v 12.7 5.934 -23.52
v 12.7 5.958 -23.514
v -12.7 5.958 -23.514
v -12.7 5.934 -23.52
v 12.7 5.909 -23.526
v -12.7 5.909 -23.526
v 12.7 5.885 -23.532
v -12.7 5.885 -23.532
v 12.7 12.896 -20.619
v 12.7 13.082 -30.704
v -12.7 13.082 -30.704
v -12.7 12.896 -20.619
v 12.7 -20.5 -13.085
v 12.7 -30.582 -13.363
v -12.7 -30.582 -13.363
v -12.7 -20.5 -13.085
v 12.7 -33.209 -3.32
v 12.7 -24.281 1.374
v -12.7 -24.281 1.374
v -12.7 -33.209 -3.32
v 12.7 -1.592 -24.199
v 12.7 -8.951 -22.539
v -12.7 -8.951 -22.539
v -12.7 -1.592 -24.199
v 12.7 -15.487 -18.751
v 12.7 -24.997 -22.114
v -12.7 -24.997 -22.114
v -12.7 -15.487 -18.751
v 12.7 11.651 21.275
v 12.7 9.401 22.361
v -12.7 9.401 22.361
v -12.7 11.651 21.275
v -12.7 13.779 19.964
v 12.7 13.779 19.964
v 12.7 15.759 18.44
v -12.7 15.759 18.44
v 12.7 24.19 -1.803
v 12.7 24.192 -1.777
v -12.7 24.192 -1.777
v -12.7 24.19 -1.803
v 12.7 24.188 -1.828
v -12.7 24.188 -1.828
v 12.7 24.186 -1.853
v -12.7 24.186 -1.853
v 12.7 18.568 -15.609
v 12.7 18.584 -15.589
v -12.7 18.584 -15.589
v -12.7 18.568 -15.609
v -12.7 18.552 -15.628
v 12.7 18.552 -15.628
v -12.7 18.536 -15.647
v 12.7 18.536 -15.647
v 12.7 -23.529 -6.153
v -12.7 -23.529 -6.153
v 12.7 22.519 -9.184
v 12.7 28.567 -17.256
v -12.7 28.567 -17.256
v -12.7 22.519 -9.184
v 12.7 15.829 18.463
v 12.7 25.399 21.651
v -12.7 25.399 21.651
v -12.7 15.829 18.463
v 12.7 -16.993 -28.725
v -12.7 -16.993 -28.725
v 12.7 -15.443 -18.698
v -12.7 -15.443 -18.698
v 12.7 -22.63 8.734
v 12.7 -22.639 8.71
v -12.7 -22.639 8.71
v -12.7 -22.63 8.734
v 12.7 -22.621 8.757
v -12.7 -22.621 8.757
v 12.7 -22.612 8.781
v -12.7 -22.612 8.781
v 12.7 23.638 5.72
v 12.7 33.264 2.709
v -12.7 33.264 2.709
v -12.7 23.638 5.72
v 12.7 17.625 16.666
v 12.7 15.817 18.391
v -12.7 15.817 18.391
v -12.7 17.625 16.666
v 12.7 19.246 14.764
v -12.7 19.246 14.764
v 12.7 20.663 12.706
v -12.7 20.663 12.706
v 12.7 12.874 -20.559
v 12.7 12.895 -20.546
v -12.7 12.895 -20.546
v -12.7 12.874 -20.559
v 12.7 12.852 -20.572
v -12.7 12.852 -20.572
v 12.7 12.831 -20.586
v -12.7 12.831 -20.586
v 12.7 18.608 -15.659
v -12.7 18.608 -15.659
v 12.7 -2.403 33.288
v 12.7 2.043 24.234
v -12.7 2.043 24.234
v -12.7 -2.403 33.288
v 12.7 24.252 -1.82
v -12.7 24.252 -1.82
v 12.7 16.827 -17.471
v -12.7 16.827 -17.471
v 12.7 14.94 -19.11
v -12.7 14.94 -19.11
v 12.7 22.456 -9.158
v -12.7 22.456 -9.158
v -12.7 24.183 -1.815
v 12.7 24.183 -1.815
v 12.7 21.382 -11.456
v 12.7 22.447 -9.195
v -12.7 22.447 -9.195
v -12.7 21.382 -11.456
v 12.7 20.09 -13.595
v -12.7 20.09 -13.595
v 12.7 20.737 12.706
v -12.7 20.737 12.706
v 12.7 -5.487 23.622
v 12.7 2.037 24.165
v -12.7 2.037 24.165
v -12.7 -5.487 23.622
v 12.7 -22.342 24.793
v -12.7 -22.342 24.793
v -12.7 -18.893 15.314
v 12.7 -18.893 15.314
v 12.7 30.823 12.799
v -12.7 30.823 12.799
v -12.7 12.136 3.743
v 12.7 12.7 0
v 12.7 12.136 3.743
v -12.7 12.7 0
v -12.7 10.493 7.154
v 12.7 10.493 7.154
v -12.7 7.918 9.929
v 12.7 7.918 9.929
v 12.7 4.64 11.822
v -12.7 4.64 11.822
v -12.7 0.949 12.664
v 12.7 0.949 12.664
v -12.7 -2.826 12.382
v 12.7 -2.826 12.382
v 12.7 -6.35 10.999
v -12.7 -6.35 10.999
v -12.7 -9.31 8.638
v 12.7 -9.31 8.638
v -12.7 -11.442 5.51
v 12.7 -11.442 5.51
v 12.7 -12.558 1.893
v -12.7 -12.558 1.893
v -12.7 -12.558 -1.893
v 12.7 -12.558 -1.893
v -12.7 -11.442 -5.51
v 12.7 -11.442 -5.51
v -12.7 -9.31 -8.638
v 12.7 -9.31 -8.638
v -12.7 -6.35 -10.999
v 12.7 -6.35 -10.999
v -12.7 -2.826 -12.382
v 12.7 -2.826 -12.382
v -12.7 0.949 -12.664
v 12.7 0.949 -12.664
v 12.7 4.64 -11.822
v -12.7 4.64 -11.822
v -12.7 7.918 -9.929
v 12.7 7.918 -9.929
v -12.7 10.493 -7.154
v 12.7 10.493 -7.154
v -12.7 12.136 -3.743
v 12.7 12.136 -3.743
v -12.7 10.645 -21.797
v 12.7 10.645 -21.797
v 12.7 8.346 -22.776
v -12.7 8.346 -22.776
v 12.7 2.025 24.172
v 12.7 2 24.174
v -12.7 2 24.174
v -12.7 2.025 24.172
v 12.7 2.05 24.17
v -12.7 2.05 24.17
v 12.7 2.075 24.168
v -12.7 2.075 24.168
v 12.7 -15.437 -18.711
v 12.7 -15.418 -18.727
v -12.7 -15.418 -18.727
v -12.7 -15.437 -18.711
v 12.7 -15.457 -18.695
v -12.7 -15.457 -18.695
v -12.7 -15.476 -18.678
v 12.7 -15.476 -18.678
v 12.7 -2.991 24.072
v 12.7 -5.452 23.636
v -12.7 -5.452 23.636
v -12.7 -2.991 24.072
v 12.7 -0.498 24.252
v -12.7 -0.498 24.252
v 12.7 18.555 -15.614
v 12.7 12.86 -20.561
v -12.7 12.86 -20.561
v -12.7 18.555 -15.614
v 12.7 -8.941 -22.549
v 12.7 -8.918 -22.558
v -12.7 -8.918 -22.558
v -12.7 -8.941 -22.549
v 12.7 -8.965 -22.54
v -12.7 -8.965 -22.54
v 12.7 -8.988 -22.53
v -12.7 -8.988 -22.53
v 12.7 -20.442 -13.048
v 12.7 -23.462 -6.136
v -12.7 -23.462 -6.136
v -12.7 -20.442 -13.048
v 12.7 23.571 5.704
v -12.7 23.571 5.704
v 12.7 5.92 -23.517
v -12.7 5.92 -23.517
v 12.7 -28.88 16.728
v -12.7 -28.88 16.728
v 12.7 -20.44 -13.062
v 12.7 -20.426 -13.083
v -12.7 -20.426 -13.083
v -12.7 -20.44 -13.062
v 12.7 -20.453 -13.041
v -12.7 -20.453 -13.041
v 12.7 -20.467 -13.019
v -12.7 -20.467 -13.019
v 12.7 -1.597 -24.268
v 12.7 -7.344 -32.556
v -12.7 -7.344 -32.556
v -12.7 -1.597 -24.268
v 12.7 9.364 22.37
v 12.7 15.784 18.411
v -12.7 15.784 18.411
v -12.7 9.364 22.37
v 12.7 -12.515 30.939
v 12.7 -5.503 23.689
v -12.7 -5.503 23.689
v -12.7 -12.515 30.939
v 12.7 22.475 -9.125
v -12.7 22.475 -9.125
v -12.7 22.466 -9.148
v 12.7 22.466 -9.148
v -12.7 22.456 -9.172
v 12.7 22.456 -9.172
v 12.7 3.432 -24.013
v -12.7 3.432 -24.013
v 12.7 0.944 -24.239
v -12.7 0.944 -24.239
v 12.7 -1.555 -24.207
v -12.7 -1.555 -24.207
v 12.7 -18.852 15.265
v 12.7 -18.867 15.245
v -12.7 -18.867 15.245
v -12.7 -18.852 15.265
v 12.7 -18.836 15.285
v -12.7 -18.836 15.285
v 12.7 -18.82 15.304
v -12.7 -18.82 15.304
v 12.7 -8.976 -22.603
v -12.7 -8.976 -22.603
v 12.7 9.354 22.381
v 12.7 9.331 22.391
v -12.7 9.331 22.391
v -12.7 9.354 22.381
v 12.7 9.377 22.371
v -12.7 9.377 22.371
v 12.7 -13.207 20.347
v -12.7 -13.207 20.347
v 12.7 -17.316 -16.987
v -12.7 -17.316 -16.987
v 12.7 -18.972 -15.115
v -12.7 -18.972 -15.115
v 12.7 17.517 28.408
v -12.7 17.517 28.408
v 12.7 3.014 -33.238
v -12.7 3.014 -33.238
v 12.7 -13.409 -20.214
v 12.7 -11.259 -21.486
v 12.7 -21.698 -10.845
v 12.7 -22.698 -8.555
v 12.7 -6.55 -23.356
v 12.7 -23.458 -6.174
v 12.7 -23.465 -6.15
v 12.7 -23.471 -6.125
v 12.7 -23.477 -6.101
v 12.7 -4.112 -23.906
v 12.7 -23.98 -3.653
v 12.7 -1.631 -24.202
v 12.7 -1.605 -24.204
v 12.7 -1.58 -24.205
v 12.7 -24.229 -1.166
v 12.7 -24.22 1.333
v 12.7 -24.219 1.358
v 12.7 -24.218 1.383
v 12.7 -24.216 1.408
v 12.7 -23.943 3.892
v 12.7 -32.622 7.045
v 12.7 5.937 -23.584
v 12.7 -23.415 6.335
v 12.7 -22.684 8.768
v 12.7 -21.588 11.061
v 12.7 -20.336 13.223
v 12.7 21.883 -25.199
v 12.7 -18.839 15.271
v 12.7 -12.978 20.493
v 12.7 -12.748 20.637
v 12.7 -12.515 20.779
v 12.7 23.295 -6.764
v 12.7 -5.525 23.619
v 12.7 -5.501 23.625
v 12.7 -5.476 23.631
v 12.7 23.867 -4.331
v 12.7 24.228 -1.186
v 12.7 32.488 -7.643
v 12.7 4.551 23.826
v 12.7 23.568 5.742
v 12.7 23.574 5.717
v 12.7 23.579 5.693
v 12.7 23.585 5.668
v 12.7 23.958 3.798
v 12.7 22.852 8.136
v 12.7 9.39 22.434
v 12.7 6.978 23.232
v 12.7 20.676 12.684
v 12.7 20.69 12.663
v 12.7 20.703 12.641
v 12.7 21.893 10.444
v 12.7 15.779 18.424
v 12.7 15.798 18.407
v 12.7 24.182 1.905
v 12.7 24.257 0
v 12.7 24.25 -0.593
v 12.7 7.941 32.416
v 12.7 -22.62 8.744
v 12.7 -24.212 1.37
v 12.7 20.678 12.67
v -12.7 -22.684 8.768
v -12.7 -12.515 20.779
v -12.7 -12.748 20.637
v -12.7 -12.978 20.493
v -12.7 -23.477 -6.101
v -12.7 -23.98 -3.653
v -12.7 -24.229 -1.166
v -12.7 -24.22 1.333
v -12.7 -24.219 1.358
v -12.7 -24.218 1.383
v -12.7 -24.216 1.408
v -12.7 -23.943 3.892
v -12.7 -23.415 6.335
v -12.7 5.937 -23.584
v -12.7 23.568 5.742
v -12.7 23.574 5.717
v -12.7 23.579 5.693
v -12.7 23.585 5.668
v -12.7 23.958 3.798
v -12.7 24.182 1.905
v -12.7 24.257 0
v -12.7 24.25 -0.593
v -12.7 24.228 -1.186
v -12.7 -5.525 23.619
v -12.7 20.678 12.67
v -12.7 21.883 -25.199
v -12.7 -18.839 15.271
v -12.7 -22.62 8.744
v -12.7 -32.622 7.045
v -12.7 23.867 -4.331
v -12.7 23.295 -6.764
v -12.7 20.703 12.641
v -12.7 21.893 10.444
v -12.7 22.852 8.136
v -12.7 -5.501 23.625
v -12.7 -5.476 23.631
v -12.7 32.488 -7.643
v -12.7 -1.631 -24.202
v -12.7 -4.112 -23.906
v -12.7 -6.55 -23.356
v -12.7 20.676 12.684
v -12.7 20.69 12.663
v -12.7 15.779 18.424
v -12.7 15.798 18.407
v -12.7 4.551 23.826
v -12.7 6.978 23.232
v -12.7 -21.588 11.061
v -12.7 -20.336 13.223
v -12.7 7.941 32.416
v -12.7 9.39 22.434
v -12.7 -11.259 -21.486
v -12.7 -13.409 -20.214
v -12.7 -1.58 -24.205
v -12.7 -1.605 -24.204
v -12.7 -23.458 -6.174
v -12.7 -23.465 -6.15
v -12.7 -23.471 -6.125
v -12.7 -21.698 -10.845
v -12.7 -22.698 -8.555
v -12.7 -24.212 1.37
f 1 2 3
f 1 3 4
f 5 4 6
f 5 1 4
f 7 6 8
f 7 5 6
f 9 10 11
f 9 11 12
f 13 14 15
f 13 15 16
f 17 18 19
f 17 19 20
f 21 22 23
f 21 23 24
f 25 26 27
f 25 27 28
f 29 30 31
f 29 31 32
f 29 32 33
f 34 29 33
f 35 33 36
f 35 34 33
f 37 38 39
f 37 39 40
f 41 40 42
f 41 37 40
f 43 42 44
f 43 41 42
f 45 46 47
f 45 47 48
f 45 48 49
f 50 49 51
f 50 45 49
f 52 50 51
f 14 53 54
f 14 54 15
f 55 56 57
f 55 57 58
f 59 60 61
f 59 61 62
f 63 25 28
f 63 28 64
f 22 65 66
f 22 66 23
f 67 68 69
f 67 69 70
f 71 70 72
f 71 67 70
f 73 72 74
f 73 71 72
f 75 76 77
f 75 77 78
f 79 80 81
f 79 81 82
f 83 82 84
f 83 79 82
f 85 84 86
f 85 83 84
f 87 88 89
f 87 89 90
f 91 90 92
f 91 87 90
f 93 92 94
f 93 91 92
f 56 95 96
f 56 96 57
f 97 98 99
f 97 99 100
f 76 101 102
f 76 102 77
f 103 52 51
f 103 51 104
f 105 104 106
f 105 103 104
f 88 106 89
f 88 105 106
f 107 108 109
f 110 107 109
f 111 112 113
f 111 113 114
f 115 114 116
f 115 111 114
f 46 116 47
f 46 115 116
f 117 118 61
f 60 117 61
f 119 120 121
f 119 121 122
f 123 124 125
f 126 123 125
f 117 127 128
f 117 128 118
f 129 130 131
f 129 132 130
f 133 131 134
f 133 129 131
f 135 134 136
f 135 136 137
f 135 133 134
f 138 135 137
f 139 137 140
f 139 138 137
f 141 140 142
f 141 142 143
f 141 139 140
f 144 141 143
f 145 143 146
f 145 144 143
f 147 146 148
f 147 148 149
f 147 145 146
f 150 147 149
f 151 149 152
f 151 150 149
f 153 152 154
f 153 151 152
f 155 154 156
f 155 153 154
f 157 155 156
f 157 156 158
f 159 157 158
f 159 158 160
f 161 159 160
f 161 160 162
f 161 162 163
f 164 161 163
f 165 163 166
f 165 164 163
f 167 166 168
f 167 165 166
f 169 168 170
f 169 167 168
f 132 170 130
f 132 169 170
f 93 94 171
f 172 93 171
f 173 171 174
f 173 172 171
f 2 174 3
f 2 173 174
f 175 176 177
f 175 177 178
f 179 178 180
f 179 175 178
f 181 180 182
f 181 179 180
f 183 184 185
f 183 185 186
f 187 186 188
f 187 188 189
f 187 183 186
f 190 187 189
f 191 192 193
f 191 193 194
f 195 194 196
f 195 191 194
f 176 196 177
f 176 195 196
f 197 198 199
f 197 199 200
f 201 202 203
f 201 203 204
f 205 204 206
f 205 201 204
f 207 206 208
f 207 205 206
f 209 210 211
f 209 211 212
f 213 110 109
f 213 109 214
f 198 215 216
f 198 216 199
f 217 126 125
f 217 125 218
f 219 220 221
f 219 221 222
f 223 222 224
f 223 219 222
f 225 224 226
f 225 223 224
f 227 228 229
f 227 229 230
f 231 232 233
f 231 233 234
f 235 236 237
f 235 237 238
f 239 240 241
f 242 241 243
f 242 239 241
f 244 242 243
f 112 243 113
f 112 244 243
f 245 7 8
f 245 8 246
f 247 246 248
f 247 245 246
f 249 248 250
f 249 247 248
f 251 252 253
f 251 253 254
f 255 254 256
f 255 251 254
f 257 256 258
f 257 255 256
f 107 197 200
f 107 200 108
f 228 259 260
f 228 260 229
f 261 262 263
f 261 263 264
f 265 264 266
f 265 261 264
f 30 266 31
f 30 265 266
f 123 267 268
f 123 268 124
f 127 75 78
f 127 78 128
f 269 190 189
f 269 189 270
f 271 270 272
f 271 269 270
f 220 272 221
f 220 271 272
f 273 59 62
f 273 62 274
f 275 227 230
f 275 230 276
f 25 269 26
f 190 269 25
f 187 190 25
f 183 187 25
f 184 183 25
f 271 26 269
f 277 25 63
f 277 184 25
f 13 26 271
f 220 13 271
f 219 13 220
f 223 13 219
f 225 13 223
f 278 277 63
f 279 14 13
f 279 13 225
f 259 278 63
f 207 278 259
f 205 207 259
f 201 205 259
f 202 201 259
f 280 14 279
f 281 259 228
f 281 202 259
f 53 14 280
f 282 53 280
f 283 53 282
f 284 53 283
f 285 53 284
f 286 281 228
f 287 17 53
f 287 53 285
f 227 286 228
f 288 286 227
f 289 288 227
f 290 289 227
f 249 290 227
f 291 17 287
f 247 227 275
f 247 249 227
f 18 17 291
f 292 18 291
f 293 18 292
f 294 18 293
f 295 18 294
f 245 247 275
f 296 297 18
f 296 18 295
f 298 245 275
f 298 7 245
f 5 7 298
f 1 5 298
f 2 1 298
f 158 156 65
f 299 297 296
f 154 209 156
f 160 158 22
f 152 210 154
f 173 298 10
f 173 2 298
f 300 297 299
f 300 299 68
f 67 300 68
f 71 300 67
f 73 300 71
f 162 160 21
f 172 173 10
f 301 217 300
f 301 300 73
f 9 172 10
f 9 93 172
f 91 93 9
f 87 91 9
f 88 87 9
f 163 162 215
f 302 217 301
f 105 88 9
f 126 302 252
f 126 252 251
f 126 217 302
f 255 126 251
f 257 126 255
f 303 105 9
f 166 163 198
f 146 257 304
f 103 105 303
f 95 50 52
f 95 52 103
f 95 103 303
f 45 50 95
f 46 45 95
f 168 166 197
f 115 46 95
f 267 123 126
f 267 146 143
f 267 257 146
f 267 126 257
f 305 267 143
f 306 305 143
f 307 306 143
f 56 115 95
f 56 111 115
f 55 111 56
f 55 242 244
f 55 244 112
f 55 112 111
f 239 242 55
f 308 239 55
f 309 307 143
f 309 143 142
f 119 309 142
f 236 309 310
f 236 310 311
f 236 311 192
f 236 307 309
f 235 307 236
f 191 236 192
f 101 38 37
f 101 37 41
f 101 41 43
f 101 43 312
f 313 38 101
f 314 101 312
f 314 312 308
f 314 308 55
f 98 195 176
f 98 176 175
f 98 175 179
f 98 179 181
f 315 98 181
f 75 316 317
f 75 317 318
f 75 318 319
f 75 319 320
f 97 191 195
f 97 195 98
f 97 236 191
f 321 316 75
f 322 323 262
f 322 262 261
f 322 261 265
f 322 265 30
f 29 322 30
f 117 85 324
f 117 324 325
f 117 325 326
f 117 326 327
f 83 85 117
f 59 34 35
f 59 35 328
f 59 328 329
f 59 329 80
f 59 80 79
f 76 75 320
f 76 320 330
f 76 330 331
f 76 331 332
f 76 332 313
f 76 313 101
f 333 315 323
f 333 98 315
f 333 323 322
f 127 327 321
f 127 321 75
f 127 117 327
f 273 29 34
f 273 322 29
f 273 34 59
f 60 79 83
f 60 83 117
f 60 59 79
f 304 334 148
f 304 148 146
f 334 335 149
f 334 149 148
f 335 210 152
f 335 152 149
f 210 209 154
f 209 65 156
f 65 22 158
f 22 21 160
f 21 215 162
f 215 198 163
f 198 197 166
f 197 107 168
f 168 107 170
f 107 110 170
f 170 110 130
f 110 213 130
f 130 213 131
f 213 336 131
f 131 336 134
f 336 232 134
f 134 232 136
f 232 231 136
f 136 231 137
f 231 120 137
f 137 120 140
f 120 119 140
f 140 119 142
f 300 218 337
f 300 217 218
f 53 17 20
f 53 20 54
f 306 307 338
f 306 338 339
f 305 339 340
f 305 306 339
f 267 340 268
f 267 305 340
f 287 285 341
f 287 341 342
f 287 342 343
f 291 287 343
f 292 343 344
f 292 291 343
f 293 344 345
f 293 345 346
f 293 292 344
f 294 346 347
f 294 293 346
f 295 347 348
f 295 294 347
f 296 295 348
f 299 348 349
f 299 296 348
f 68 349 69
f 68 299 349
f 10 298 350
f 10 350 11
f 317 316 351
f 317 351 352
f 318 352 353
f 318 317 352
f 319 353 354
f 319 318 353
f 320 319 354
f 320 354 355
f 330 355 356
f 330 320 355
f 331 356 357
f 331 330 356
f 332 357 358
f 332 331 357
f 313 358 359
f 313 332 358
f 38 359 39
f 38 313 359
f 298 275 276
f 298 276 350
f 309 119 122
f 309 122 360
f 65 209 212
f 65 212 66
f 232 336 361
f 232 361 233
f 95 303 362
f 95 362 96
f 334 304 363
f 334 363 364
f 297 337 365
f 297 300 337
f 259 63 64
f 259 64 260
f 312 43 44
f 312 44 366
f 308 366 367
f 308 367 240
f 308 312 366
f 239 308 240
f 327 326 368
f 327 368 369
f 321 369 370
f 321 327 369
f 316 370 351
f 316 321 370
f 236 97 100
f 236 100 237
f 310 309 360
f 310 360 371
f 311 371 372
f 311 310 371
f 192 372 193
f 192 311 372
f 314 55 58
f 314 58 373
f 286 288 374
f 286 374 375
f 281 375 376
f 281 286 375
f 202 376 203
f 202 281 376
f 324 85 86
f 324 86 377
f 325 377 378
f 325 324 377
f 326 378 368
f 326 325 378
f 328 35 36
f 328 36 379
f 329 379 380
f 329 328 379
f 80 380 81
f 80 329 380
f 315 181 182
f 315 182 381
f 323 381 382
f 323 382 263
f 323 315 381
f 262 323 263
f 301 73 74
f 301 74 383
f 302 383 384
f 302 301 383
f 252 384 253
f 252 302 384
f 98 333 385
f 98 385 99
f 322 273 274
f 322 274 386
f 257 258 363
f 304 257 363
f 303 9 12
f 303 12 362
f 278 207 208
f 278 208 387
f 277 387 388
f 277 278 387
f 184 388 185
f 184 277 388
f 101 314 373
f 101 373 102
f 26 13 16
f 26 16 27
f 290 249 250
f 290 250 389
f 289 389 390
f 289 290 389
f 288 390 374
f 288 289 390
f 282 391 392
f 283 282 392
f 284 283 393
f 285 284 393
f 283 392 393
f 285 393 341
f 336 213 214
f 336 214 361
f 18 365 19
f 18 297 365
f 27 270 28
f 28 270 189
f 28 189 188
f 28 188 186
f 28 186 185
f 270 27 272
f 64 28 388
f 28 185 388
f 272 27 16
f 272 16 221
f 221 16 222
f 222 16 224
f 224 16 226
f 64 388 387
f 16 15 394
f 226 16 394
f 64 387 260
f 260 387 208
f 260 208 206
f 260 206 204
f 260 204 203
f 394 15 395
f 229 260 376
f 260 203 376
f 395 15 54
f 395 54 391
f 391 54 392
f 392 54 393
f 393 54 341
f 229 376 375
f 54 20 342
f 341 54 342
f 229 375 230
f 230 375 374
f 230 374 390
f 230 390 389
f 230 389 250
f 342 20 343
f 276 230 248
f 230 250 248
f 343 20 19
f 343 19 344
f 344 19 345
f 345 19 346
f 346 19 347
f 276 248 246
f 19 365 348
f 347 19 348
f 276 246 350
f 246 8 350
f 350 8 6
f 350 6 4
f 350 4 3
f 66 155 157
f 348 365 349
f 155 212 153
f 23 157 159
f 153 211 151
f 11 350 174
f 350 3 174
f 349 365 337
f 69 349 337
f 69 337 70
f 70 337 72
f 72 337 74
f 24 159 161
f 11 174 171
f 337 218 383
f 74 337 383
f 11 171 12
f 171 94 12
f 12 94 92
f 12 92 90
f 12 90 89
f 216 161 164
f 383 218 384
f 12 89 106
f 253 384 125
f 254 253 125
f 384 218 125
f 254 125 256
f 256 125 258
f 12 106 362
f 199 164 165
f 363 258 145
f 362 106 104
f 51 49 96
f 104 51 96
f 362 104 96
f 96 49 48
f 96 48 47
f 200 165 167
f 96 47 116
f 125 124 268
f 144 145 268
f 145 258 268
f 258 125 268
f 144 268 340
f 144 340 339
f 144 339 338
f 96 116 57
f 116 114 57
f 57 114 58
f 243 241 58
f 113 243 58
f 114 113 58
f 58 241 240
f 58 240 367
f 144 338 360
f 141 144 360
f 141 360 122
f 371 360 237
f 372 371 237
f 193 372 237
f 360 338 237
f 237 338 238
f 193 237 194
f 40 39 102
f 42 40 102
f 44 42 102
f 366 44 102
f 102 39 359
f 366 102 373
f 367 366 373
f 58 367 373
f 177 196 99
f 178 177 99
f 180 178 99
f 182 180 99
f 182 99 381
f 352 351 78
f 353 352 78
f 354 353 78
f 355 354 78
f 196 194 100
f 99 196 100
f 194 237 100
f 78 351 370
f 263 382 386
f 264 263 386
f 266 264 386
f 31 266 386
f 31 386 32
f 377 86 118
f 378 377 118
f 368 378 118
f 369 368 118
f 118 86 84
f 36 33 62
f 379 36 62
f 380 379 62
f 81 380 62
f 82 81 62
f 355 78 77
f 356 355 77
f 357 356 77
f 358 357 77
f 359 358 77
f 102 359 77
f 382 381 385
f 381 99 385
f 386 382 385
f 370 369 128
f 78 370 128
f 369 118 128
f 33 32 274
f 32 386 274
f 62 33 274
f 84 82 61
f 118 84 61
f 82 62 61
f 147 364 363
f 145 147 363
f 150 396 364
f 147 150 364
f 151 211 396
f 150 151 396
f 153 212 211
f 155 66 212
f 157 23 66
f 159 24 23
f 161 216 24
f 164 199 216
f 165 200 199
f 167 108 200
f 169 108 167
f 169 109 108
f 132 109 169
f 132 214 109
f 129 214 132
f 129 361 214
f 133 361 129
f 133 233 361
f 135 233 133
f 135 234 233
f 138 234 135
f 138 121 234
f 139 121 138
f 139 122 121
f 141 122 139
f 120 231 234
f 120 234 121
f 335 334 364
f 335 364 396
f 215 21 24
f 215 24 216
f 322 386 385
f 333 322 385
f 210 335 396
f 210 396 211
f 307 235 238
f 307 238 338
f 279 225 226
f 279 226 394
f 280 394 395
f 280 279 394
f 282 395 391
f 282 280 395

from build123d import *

# Parameters (mm, degrees)
F0_R     = 12.7
F1_DEPTH = 12.7


with BuildPart() as f1:
    # F0 (on Right) → F1 (new body, symmetric)
    with BuildSketch(Plane.YZ):
        with BuildLine():
            ThreePointArc((23.5854054871, 5.6683945708), (24.0885162463, 2.8540206814), (24.257, 0))
            ThreePointArc((24.257, 0), (24.2406926461, -0.8893081786), (24.1917925105, -1.7774206395))
            Line((24.1917925105, -1.7774206395), (24.2518372175, -1.8198767227))
            Line((24.2518372175, -1.8198767227), (33.2643587406, 2.7090486284))
            Line((33.2643587406, 2.7090486284), (23.6377892706, 5.7200068277))
            Line((23.6377892706, 5.7200068277), (23.5854054871, 5.6683945708))
        make_face()
        with BuildLine():
            ThreePointArc((23.5676039215, 5.7419591081), (23.5765333967, 5.7051837826), (23.5854054871, 5.6683945708))
            Line((23.5854054871, 5.6683945708), (23.6377892706, 5.7200068277))
            Line((23.6377892706, 5.7200068277), (23.5676039215, 5.7419591081))
        make_face()
        with BuildLine():
            Line((24.2518372175, -1.8198767227), (24.1917925105, -1.7774206395))
            ThreePointArc((24.1917925105, -1.7774206395), (24.1889900762, -1.8151606243), (24.1861287664, -1.8528961911))
            Line((24.1861287664, -1.8528961911), (24.2518372175, -1.8198767227))
        make_face()
        with BuildLine():
            ThreePointArc((20.7026825957, 12.6412413291), (22.402334496, 9.3025511624), (23.5676039215, 5.7419591081))
            Line((23.5676039215, 5.7419591081), (23.6377892706, 5.7200068277))
            Line((23.6377892706, 5.7200068277), (30.8227094509, 12.7991050077))
            Line((30.8227094509, 12.7991050077), (20.7366733326, 12.7064526444))
            Line((20.7366733326, 12.7064526444), (20.7026825957, 12.6412413291))
        make_face()
        with BuildLine():
            Line((24.1830190921, -1.814712557), (23.5707135958, 5.7037754741))
            Line((23.5707135958, 5.7037754741), (20.6778299975, 12.6703962317))
            Line((20.6778299975, 12.6703962317), (15.7842684775, 18.4110961842))
            Line((15.7842684775, 18.4110961842), (9.3635042744, 22.37043544))
            Line((9.3635042744, 22.37043544), (2.0367767147, 24.1653291864))
            Line((2.0367767147, 24.1653291864), (-5.4870186323, 23.622112958))
            Line((-5.4870186323, 23.622112958), (-12.5154333238, 20.778979227))
            ThreePointArc((-12.5154333238, 20.778979227), (-12.8629795573, 20.5656462556), (-13.2068903428, 20.346500841))
            Line((-13.2068903428, 20.346500841), (-18.839030758, 15.270969654))
            Line((-18.839030758, 15.270969654), (-22.6199467454, 8.7435463805))
            Line((-22.6199467454, 8.7435463805), (-24.2122758236, 1.370143611))
            Line((-24.2122758236, 1.370143611), (-23.4619526177, -6.1358270378))
            Line((-23.4619526177, -6.1358270378), (-20.4415744492, -13.0481273795))
            Line((-20.4415744492, -13.0481273795), (-15.4433772015, -18.6979596396))
            Line((-15.4433772015, -18.6979596396), (-8.9509601151, -22.5386758061))
            Line((-8.9509601151, -22.5386758061), (-1.5924952722, -24.1986684113))
            Line((-1.5924952722, -24.1986684113), (5.9200510257, -23.517325314))
            Line((5.9200510257, -23.517325314), (12.859804367, -20.5605696837))
            Line((12.859804367, -20.5605696837), (18.5553107694, -15.614481622))
            Line((18.5553107694, -15.614481622), (22.4555030315, -9.1576185591))
            Line((22.4555030315, -9.1576185591), (24.1830190921, -1.814712557))
        make_face()
        Circle(F0_R, mode=Mode.SUBTRACT)
        with BuildLine():
            Line((24.2518372175, -1.8198767227), (24.1861287664, -1.8528961911))
            ThreePointArc((24.1861287664, -1.8528961911), (23.6123426483, -5.5551168898), (22.4753106729, -9.1248265276))
            Line((22.4753106729, -9.1248265276), (22.5194051282, -9.1836785866))
            Line((22.5194051282, -9.1836785866), (32.4875238799, -7.6431210279))
            Line((32.4875238799, -7.6431210279), (24.2518372175, -1.8198767227))
        make_face()
        with BuildLine():
            ThreePointArc((20.6631381062, 12.705777135), (20.6829355219, 12.6735246556), (20.7026825957, 12.6412413291))
            Line((20.7026825957, 12.6412413291), (20.7366733326, 12.7064526444))
            Line((20.7366733326, 12.7064526444), (20.6631381062, 12.705777135))
        make_face()
        with BuildLine():
            Line((22.5194051282, -9.1836785866), (22.4753106729, -9.1248265276))
            ThreePointArc((22.4753106729, -9.1248265276), (22.4610474779, -9.1598796496), (22.4467296132, -9.1949104766))
            Line((22.4467296132, -9.1949104766), (22.5194051282, -9.1836785866))
        make_face()
        with BuildLine():
            ThreePointArc((15.8168771762, 18.3909881571), (18.460181062, 15.7360657141), (20.6631381062, 12.705777135))
            Line((20.6631381062, 12.705777135), (20.7366733326, 12.7064526444))
            Line((20.7366733326, 12.7064526444), (25.3988171361, 21.6507873986))
            Line((25.3988171361, 21.6507873986), (15.8291861018, 18.4634890273))
            Line((15.8291861018, 18.4634890273), (15.8168771762, 18.3909881571))
        make_face()
        with BuildLine():
            Line((22.5194051282, -9.1836785866), (22.4467296132, -9.1949104766))
            ThreePointArc((22.4467296132, -9.1949104766), (20.7631233508, -12.5417206841), (18.5842361506, -15.5893622608))
            Line((18.5842361506, -15.5893622608), (18.608114007, -15.6589160803))
            Line((18.608114007, -15.6589160803), (28.5673673184, -17.2557825493))
            Line((28.5673673184, -17.2557825493), (22.5194051282, -9.1836785866))
        make_face()
        with BuildLine():
            ThreePointArc((15.7594158792, 18.4402510868), (15.7881657418, 18.4156420336), (15.8168771762, 18.3909881571))
            Line((15.8168771762, 18.3909881571), (15.8291861018, 18.4634890273))
            Line((15.8291861018, 18.4634890273), (15.7594158792, 18.4402510868))
        make_face()
        with BuildLine():
            ThreePointArc((9.4007140276, 22.3613198352), (12.7319177371, 20.6470414282), (15.7594158792, 18.4402510868))
            Line((15.7594158792, 18.4402510868), (15.8291861018, 18.4634890273))
            Line((15.8291861018, 18.4634890273), (17.5174690492, 28.4076536343))
            Line((17.5174690492, 28.4076536343), (9.3901501952, 22.4340954581))
            Line((9.3901501952, 22.4340954581), (9.4007140276, 22.3613198352))
        make_face()
        with BuildLine():
            Line((18.608114007, -15.6589160803), (18.5842361506, -15.5893622608))
            ThreePointArc((18.5842361506, -15.5893622608), (18.5598922266, -15.6183369645), (18.5355031281, -15.6472736535))
            Line((18.5355031281, -15.6472736535), (18.608114007, -15.6589160803))
        make_face()
        with BuildLine():
            Line((18.608114007, -15.6589160803), (18.5355031281, -15.6472736535))
            ThreePointArc((18.5355031281, -15.6472736535), (15.9049735961, -18.3148536415), (12.8950488205, -20.5455534099))
            Line((12.8950488205, -20.5455534099), (12.8963997824, -20.6190793287))
            Line((12.8963997824, -20.6190793287), (21.8831827577, -25.1988654365))
            Line((21.8831827577, -25.1988654365), (18.608114007, -15.6589160803))
        make_face()
        with BuildLine():
            ThreePointArc((9.3308955757, 22.3905434672), (9.3658161997, 22.3759588825), (9.4007140276, 22.3613198352))
            Line((9.4007140276, 22.3613198352), (9.3901501952, 22.4340954581))
            Line((9.3901501952, 22.4340954581), (9.3308955757, 22.3905434672))
        make_face()
        with BuildLine():
            ThreePointArc((2.0749873027, 24.1680879818), (5.7717811102, 23.5603181603), (9.3308955757, 22.3905434672))
            Line((9.3308955757, 22.3905434672), (9.3901501952, 22.4340954581))
            Line((9.3901501952, 22.4340954581), (7.9412229206, 32.4159449256))
            Line((7.9412229206, 32.4159449256), (2.042572813, 24.2340969713))
            Line((2.042572813, 24.2340969713), (2.0749873027, 24.1680879818))
        make_face()
        with BuildLine():
            Line((12.8963997824, -20.6190793287), (12.8950488205, -20.5455534099))
            ThreePointArc((12.8950488205, -20.5455534099), (12.8629795573, -20.5656462556), (12.8308789858, -20.5856890449))
            Line((12.8308789858, -20.5856890449), (12.8963997824, -20.6190793287))
        make_face()
        with BuildLine():
            Line((12.8963997824, -20.6190793287), (12.8308789858, -20.5856890449))
            ThreePointArc((12.8308789858, -20.5856890449), (9.5079423667, -22.3159378237), (5.9582044839, -23.5138650232))
            Line((5.9582044839, -23.5138650232), (5.9368978393, -23.5842490607))
            Line((5.9368978393, -23.5842490607), (13.0816966908, -30.7038388248))
            Line((13.0816966908, -30.7038388248), (12.8963997824, -20.6190793287))
        make_face()
        with BuildLine():
            ThreePointArc((1.9995669615, 24.1744447913), (2.0372796114, 24.1712958028), (2.0749873027, 24.1680879818))
            Line((2.0749873027, 24.1680879818), (2.042572813, 24.2340969713))
            Line((2.042572813, 24.2340969713), (1.9995669615, 24.1744447913))
        make_face()
        with BuildLine():
            Line((-12.5154333238, 20.778979227), (-5.4870186323, 23.622112958))
            Line((-5.4870186323, 23.622112958), (-5.5252292203, 23.6193541627))
            ThreePointArc((-5.5252292203, 23.6193541627), (-9.1314461451, 22.4726220166), (-12.5154333238, 20.778979227))
        make_face()
        with BuildLine():
            ThreePointArc((-5.4515042648, 23.636479227), (-1.7468026573, 24.1940225981), (1.9995669615, 24.1744447913))
            Line((1.9995669615, 24.1744447913), (2.042572813, 24.2340969713))
            Line((2.042572813, 24.2340969713), (-2.4033741119, 33.2878401188))
            Line((-2.4033741119, 33.2878401188), (-5.5026331565, 23.689334901))
            Line((-5.5026331565, 23.689334901), (-5.4515042648, 23.636479227))
        make_face()
        with BuildLine():
            Line((5.9368978393, -23.5842490607), (5.9582044839, -23.5138650232))
            ThreePointArc((5.9582044839, -23.5138650232), (5.9215127345, -23.523131933), (5.8848065722, -23.5323415879))
            Line((5.8848065722, -23.5323415879), (5.9368978393, -23.5842490607))
        make_face()
        with BuildLine():
            Line((5.9368978393, -23.5842490607), (5.8848065722, -23.5323415879))
            ThreePointArc((5.8848065722, -23.5323415879), (2.1909727116, -24.1578493988), (-1.555124337, -24.2070989029))
            Line((-1.555124337, -24.2070989029), (-1.5970270694, -24.2675310703))
            Line((-1.5970270694, -24.2675310703), (3.0144945526, -33.2380704838))
            Line((3.0144945526, -33.2380704838), (5.9368978393, -23.5842490607))
        make_face()
        with BuildLine():
            ThreePointArc((-5.5252292203, 23.6193541627), (-5.4883734219, 23.6279454499), (-5.4515042648, 23.636479227))
            Line((-5.4515042648, 23.636479227), (-5.5026331565, 23.689334901))
            Line((-5.5026331565, 23.689334901), (-5.5252292203, 23.6193541627))
        make_face()
        with BuildLine():
            Line((-12.5154333238, 30.938979227), (-12.5154333238, 20.778979227))
            ThreePointArc((-12.5154333238, 20.778979227), (-9.1314461451, 22.4726220166), (-5.5252292203, 23.6193541627))
            Line((-5.5252292203, 23.6193541627), (-5.5026331565, 23.689334901))
            Line((-5.5026331565, 23.689334901), (-12.5154333238, 30.938979227))
        make_face()
        with BuildLine():
            Line((-1.5970270694, -24.2675310703), (-1.555124337, -24.2070989029))
            ThreePointArc((-1.555124337, -24.2070989029), (-1.5928884722, -24.2046432594), (-1.6306487304, -24.2021287022))
            Line((-1.6306487304, -24.2021287022), (-1.5970270694, -24.2675310703))
        make_face()
        with BuildLine():
            Line((-1.5970270694, -24.2675310703), (-1.6306487304, -24.2021287022))
            ThreePointArc((-1.6306487304, -24.2021287022), (-5.3379839233, -23.662374704), (-8.9179875178, -22.5581813902))
            Line((-8.9179875178, -22.5581813902), (-8.9764320503, -22.6028145892))
            Line((-8.9764320503, -22.6028145892), (-7.3443742013, -32.5563615056))
            Line((-7.3443742013, -32.5563615056), (-1.5970270694, -24.2675310703))
        make_face()
        with BuildLine():
            Line((-18.839030758, 15.270969654), (-13.2068903428, 20.346500841))
            ThreePointArc((-13.2068903428, 20.346500841), (-16.2106164918, 18.0448874188), (-18.819828877, 15.3041200348))
            Line((-18.819828877, 15.3041200348), (-18.839030758, 15.270969654))
        make_face()
        with BuildLine():
            ThreePointArc((-18.819828877, 15.3041200348), (-16.2106164918, 18.0448874188), (-13.2068903428, 20.346500841))
            Line((-13.2068903428, 20.346500841), (-22.3424144499, 24.7926001751))
            Line((-22.3424144499, 24.7926001751), (-18.8926413835, 15.3144265731))
            Line((-18.8926413835, 15.3144265731), (-18.819828877, 15.3041200348))
        make_face()
        with BuildLine():
            Line((-8.9764320503, -22.6028145892), (-8.9179875178, -22.5581813902))
            ThreePointArc((-8.9179875178, -22.5581813902), (-8.95317018, -22.5442407885), (-8.9883310503, -22.5302453145))
            Line((-8.9883310503, -22.5302453145), (-8.9764320503, -22.6028145892))
        make_face()
        with BuildLine():
            Line((-8.9764320503, -22.6028145892), (-8.9883310503, -22.5302453145))
            ThreePointArc((-8.9883310503, -22.5302453145), (-12.3504653486, -20.8774532612), (-15.4179931969, -18.7266530587))
            Line((-15.4179931969, -18.7266530587), (-15.4873247444, -18.7511688161))
            Line((-15.4873247444, -18.7511688161), (-16.9926399899, -28.7246704605))
            Line((-16.9926399899, -28.7246704605), (-8.9764320503, -22.6028145892))
        make_face()
        with BuildLine():
            ThreePointArc((-18.8674897937, 15.2453231479), (-18.8436822679, 15.2747401806), (-18.819828877, 15.3041200348))
            Line((-18.819828877, 15.3041200348), (-18.8926413835, 15.3144265731))
            Line((-18.8926413835, 15.3144265731), (-18.8674897937, 15.2453231479))
        make_face()
        with BuildLine():
            Line((-15.4873247444, -18.7511688161), (-15.4179931969, -18.7266530587))
            ThreePointArc((-15.4179931969, -18.7266530587), (-15.447190297, -18.702576318), (-15.4763497988, -18.6784540555))
            Line((-15.4763497988, -18.6784540555), (-15.4873247444, -18.7511688161))
        make_face()
        with BuildLine():
            Line((-15.4873247444, -18.7511688161), (-15.4763497988, -18.6784540555))
            ThreePointArc((-15.4763497988, -18.6784540555), (-18.167980796, -16.072539401), (-20.4262350599, -13.0832324093))
            Line((-20.4262350599, -13.0832324093), (-20.499745467, -13.0852587096))
            Line((-20.499745467, -13.0852587096), (-24.9967874323, -22.1137315928))
            Line((-24.9967874323, -22.1137315928), (-15.4873247444, -18.7511688161))
        make_face()
        with BuildLine():
            ThreePointArc((-22.611859892, 8.7809931799), (-20.9900215119, 12.158167869), (-18.8674897937, 15.2453231479))
            Line((-18.8674897937, 15.2453231479), (-18.8926413835, 15.3144265731))
            Line((-18.8926413835, 15.3144265731), (-28.8795497873, 16.7280635752))
            Line((-28.8795497873, 16.7280635752), (-22.684316803, 8.7684280741))
            Line((-22.684316803, 8.7684280741), (-22.611859892, 8.7809931799))
        make_face()
        with BuildLine():
            Line((-20.499745467, -13.0852587096), (-20.4262350599, -13.0832324093))
            ThreePointArc((-20.4262350599, -13.0832324093), (-20.4466216402, -13.0513490683), (-20.4669584538, -13.0194339605))
            Line((-20.4669584538, -13.0194339605), (-20.499745467, -13.0852587096))
        make_face()
        with BuildLine():
            Line((-20.499745467, -13.0852587096), (-20.4669584538, -13.0194339605))
            ThreePointArc((-20.4669584538, -13.0194339605), (-22.2276581111, -9.7125312815), (-23.4581420023, -6.1739471007))
            Line((-23.4581420023, -6.1739471007), (-23.5287187891, -6.1532878897))
            Line((-23.5287187891, -6.1532878897), (-30.5823773793, -13.3631845278))
            Line((-30.5823773793, -13.3631845278), (-20.499745467, -13.0852587096))
        make_face()
        with BuildLine():
            ThreePointArc((-22.6391486264, 8.7103959997), (-22.6255317943, 8.7457052333), (-22.611859892, 8.7809931799))
            Line((-22.611859892, 8.7809931799), (-22.684316803, 8.7684280741))
            Line((-22.684316803, 8.7684280741), (-22.6391486264, 8.7103959997))
        make_face()
        with BuildLine():
            ThreePointArc((-24.2160864391, 1.4082636739), (-23.7104101058, 5.1204005326), (-22.6391486264, 8.7103959997))
            Line((-22.6391486264, 8.7103959997), (-22.684316803, 8.7684280741))
            Line((-22.684316803, 8.7684280741), (-32.6224519942, 7.0450076493))
            Line((-32.6224519942, 7.0450076493), (-24.2811772055, 1.3740426575))
            Line((-24.2811772055, 1.3740426575), (-24.2160864391, 1.4082636739))
        make_face()
        with BuildLine():
            Line((-23.5287187891, -6.1532878897), (-23.4581420023, -6.1739471007))
            ThreePointArc((-23.4581420023, -6.1739471007), (-23.4677455647, -6.1373420234), (-23.477292007, -6.1007220079))
            Line((-23.477292007, -6.1007220079), (-23.5287187891, -6.1532878897))
        make_face()
        with BuildLine():
            Line((-23.5287187891, -6.1532878897), (-23.477292007, -6.1007220079))
            ThreePointArc((-23.477292007, -6.1007220079), (-24.1367042992, -2.4127897905), (-24.2203626771, 1.3326968116))
            Line((-24.2203626771, 1.3326968116), (-24.2811772055, 1.3740426575))
            Line((-24.2811772055, 1.3740426575), (-33.2089775666, -3.319686111))
            Line((-33.2089775666, -3.319686111), (-23.5287187891, -6.1532878897))
        make_face()
        with BuildLine():
            ThreePointArc((-24.2203626771, 1.3326968116), (-24.2182540315, 1.3704819106), (-24.2160864391, 1.4082636739))
            Line((-24.2160864391, 1.4082636739), (-24.2811772055, 1.3740426575))
            Line((-24.2811772055, 1.3740426575), (-24.2203626771, 1.3326968116))
        make_face()
    extrude(amount=F1_DEPTH, both=True)


solid = f1.part
